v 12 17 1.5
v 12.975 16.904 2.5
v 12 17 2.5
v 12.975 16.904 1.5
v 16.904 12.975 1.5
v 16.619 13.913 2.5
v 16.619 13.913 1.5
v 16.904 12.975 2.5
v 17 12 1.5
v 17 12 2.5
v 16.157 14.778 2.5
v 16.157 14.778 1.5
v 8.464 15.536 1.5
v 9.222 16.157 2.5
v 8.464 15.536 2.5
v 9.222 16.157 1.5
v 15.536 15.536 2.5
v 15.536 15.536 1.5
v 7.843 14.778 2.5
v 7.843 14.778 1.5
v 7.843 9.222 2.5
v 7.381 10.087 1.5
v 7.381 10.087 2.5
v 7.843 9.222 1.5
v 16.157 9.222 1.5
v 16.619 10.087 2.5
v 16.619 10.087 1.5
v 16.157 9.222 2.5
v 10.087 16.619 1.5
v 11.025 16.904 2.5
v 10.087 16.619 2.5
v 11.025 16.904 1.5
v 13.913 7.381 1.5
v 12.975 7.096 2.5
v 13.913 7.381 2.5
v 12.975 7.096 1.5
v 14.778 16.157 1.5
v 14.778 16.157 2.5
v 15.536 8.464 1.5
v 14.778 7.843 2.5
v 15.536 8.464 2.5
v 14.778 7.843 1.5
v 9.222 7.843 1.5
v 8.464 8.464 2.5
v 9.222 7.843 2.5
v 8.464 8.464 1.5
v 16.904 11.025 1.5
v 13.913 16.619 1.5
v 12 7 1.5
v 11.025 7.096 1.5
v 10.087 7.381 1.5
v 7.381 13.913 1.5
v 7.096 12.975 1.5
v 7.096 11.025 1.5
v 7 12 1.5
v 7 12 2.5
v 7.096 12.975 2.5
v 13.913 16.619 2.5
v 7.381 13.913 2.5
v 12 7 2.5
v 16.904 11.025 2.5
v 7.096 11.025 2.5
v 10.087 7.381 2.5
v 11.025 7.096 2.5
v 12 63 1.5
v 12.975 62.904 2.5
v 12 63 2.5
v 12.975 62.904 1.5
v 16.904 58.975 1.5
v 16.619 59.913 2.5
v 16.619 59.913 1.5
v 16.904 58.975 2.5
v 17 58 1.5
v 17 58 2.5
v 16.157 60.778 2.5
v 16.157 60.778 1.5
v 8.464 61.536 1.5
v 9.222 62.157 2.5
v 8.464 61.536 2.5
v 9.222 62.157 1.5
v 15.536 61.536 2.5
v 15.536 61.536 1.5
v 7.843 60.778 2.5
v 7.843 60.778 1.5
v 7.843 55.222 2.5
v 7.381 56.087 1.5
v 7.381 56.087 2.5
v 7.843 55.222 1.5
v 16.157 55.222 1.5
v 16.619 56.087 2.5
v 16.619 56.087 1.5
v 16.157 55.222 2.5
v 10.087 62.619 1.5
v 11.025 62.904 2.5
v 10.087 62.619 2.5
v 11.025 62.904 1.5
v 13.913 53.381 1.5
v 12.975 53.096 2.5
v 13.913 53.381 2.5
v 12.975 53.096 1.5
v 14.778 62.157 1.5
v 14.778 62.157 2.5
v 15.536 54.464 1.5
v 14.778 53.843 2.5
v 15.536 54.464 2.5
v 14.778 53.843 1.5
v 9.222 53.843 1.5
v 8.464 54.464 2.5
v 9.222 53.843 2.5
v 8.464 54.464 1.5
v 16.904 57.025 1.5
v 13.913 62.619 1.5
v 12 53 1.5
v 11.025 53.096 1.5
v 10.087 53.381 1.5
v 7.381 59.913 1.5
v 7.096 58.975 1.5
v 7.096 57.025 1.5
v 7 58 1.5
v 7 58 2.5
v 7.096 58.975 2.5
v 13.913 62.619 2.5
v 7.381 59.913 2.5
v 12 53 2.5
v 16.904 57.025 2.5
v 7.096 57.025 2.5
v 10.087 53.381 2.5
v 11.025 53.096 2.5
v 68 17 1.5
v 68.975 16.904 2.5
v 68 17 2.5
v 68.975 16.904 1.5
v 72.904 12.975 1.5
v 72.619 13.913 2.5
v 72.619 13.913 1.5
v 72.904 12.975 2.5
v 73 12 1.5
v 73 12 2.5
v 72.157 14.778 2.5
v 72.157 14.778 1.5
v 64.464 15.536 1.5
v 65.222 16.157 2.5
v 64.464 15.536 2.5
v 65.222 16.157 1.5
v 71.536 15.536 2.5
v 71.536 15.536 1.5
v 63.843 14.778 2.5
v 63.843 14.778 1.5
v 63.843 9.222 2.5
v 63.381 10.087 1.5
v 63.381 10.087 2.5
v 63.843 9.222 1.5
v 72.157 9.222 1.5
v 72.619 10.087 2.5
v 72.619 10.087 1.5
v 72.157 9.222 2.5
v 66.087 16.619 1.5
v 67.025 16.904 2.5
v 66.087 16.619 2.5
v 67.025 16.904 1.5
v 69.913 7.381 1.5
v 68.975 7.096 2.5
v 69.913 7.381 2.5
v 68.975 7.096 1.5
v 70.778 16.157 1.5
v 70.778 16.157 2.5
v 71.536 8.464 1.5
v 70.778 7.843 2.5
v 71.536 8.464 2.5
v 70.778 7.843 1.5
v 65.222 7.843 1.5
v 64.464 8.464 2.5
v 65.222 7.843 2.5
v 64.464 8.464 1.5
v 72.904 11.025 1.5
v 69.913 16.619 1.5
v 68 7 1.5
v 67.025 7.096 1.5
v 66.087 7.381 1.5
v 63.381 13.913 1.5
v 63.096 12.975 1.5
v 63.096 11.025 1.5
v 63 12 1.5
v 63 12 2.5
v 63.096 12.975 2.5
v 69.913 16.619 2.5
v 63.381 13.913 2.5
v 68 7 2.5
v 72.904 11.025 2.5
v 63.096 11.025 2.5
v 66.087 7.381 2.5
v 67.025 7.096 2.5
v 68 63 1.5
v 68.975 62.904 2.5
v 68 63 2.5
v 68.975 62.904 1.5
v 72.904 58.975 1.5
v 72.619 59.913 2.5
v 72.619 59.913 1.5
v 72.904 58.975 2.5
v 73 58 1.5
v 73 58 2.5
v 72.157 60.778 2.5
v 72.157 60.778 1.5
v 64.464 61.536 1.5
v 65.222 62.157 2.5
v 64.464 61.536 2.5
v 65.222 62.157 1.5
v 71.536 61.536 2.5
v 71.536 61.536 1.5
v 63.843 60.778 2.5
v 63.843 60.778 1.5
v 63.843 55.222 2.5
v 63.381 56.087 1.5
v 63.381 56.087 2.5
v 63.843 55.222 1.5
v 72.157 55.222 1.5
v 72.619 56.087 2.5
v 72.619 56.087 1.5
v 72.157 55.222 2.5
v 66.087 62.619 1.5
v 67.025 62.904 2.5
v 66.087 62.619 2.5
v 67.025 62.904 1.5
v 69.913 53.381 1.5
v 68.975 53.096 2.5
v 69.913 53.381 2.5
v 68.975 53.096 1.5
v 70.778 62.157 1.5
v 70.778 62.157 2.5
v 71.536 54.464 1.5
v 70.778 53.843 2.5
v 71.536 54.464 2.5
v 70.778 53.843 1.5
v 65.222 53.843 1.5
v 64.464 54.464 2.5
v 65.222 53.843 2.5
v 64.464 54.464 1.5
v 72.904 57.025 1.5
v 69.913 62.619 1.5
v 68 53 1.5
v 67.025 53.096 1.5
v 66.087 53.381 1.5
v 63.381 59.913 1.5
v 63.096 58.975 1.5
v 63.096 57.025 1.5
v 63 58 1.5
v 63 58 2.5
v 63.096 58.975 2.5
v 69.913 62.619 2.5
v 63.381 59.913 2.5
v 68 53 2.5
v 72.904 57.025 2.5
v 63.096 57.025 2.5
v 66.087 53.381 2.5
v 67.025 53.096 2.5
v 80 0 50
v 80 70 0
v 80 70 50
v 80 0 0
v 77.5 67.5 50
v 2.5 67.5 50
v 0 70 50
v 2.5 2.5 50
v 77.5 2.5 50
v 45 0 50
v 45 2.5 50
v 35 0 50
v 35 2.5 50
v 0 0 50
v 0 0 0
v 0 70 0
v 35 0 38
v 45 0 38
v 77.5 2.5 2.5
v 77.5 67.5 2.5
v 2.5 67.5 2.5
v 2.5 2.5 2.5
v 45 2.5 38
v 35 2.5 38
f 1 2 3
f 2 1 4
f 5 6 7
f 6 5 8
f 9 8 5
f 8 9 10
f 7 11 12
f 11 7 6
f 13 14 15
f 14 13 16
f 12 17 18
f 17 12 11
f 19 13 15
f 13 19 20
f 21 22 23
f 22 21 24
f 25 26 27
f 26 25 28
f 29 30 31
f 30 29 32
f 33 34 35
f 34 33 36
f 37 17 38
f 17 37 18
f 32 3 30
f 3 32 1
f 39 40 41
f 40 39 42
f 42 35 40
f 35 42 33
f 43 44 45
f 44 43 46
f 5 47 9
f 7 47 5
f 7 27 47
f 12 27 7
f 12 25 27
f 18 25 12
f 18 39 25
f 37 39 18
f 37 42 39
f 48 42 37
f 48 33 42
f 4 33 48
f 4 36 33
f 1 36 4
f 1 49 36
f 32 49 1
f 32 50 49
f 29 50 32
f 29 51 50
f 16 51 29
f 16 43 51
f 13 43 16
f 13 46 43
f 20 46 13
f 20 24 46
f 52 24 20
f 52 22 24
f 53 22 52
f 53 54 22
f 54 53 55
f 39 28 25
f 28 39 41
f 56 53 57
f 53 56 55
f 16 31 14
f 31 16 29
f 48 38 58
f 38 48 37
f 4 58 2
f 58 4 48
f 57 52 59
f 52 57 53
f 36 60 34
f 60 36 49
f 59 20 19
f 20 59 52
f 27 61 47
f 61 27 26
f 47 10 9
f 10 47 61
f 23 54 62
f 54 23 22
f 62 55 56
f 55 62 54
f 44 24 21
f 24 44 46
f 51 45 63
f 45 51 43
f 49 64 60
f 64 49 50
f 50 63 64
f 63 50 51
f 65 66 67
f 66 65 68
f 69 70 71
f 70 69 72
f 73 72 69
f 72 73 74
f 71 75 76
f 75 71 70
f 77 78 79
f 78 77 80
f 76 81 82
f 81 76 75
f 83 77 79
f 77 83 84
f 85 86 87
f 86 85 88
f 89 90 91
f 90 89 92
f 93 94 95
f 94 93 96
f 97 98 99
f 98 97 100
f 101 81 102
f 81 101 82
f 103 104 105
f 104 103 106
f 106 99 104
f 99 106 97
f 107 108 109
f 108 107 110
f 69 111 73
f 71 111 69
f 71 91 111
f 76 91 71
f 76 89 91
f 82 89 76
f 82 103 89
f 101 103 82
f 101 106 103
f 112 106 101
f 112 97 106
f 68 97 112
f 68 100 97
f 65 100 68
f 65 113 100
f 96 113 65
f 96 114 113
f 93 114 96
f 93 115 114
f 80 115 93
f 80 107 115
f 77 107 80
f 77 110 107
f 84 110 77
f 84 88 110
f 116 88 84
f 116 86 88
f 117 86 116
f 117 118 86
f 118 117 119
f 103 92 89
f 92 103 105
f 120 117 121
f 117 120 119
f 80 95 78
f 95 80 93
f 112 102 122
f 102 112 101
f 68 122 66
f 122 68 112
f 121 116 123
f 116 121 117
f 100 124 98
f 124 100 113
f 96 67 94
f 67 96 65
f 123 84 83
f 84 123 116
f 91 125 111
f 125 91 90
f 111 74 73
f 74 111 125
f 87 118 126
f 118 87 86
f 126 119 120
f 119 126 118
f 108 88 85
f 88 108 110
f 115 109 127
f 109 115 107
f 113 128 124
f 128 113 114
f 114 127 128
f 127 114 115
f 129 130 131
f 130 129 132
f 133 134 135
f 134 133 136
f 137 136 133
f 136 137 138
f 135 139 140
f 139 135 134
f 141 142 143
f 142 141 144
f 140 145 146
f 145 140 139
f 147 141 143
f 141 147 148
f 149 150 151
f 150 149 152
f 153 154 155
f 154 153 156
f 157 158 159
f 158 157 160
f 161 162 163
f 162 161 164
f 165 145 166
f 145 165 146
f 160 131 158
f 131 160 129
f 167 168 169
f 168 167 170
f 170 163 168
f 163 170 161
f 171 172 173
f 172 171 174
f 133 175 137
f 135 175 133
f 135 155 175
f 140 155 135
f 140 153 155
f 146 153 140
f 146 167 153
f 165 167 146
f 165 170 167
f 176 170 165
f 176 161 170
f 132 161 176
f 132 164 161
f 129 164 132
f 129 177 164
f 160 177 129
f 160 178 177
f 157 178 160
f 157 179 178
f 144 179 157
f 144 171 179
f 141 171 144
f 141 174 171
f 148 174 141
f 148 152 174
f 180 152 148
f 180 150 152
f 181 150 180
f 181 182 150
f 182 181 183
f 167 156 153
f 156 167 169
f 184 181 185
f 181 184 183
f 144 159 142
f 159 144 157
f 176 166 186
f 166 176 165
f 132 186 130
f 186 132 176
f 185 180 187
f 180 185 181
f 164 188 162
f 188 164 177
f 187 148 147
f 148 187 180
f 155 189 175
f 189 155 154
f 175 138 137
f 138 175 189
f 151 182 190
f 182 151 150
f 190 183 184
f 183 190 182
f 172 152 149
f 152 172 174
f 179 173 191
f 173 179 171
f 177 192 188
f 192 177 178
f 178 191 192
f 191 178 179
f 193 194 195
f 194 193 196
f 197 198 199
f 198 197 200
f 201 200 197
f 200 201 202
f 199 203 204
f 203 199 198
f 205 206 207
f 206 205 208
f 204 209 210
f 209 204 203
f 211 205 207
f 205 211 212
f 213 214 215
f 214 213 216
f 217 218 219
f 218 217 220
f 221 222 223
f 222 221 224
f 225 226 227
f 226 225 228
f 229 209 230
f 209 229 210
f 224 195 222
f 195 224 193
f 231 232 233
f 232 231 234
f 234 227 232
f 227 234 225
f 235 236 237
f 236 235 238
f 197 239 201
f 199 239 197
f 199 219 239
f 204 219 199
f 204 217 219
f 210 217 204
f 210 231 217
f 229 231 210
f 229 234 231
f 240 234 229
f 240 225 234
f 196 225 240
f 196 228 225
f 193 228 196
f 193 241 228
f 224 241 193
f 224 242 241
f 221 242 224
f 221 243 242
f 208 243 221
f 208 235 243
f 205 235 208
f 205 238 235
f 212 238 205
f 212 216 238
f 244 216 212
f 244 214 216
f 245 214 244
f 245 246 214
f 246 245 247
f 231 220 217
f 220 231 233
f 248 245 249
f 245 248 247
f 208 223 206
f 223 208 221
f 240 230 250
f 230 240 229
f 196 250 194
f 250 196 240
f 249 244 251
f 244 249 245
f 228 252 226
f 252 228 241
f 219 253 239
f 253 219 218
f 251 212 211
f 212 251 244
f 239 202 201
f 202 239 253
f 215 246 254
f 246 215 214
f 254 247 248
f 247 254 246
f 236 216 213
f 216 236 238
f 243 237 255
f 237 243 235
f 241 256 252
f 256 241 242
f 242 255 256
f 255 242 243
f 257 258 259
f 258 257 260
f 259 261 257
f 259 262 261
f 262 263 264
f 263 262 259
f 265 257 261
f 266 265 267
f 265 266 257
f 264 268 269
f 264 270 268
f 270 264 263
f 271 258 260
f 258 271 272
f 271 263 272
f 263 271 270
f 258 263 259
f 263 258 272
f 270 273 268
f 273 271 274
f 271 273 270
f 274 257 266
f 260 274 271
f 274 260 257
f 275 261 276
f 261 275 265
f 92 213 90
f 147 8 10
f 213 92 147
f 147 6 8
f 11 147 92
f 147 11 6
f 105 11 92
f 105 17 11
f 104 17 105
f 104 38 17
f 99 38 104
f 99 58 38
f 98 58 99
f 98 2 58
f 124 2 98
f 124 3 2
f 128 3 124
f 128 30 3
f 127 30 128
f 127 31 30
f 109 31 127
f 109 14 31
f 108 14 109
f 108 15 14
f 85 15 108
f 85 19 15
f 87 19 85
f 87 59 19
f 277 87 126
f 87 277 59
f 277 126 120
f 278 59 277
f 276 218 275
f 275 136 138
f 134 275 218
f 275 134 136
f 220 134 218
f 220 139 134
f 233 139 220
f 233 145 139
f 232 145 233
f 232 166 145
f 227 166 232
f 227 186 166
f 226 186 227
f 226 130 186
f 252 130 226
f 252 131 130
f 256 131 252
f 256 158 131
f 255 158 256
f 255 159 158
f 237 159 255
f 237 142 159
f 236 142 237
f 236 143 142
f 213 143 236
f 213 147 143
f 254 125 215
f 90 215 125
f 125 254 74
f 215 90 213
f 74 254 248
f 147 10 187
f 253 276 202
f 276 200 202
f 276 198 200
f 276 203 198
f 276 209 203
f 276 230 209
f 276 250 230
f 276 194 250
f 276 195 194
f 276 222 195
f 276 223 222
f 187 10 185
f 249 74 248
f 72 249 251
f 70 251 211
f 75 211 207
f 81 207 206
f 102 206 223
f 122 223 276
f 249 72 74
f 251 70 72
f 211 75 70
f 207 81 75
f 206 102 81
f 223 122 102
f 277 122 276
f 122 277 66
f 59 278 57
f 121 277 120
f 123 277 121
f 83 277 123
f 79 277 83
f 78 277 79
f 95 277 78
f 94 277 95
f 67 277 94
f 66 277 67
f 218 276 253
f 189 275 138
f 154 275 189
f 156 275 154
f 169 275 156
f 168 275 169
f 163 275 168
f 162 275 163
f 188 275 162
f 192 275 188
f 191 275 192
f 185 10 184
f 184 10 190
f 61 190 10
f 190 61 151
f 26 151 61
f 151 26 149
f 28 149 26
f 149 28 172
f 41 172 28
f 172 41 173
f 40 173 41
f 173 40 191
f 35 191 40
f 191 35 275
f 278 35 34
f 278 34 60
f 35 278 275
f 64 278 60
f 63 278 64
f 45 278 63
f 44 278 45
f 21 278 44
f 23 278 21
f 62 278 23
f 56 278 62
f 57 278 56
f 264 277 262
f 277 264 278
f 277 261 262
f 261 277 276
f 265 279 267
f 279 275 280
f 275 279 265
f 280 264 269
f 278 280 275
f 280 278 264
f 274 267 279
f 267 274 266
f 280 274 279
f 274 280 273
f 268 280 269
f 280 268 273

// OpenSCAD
$fn = 32;

// ----------------------------------------------------------------------
// Enclosure box: both enclosure
// ----------------------------------------------------------------------

// --- parameters (mm) ---
box_l = 80;               // outer length, X
box_w = 70;               // outer width, Y
box_h = 50;               // outer height
wall_t = 2.5;             // wall thickness
boss_r = 5;               // corner boss radius
hole_r = 2;               // boss screw hole radius
boss_in = 12;             // boss inset from the corners
notch_w = 10;             // cable notch width
notch_h = 12;             // cable notch height

inner_h = box_h - wall_t;  // cavity depth
boss_h = inner_h - 2;  // corner boss height

difference() {
  cube([box_l, box_w, box_h]);
  translate([wall_t, wall_t, wall_t])
    cube([box_l - 2 * wall_t, box_w - 2 * wall_t, box_h]);
  for (sx = [0, 1], sy = [0, 1])
    translate([sx ? box_l - boss_in : boss_in,
               sy ? box_w - boss_in : boss_in, wall_t - 1]) {
      cylinder(r = boss_r, h = boss_h);
      translate([0, 0, boss_h - 4])
        cylinder(r = hole_r, h = 5);
    }
  translate([box_l / 2 - notch_w / 2, -1, box_h - notch_h])
    cube([notch_w, wall_t + 2, notch_h + 1]);
}
